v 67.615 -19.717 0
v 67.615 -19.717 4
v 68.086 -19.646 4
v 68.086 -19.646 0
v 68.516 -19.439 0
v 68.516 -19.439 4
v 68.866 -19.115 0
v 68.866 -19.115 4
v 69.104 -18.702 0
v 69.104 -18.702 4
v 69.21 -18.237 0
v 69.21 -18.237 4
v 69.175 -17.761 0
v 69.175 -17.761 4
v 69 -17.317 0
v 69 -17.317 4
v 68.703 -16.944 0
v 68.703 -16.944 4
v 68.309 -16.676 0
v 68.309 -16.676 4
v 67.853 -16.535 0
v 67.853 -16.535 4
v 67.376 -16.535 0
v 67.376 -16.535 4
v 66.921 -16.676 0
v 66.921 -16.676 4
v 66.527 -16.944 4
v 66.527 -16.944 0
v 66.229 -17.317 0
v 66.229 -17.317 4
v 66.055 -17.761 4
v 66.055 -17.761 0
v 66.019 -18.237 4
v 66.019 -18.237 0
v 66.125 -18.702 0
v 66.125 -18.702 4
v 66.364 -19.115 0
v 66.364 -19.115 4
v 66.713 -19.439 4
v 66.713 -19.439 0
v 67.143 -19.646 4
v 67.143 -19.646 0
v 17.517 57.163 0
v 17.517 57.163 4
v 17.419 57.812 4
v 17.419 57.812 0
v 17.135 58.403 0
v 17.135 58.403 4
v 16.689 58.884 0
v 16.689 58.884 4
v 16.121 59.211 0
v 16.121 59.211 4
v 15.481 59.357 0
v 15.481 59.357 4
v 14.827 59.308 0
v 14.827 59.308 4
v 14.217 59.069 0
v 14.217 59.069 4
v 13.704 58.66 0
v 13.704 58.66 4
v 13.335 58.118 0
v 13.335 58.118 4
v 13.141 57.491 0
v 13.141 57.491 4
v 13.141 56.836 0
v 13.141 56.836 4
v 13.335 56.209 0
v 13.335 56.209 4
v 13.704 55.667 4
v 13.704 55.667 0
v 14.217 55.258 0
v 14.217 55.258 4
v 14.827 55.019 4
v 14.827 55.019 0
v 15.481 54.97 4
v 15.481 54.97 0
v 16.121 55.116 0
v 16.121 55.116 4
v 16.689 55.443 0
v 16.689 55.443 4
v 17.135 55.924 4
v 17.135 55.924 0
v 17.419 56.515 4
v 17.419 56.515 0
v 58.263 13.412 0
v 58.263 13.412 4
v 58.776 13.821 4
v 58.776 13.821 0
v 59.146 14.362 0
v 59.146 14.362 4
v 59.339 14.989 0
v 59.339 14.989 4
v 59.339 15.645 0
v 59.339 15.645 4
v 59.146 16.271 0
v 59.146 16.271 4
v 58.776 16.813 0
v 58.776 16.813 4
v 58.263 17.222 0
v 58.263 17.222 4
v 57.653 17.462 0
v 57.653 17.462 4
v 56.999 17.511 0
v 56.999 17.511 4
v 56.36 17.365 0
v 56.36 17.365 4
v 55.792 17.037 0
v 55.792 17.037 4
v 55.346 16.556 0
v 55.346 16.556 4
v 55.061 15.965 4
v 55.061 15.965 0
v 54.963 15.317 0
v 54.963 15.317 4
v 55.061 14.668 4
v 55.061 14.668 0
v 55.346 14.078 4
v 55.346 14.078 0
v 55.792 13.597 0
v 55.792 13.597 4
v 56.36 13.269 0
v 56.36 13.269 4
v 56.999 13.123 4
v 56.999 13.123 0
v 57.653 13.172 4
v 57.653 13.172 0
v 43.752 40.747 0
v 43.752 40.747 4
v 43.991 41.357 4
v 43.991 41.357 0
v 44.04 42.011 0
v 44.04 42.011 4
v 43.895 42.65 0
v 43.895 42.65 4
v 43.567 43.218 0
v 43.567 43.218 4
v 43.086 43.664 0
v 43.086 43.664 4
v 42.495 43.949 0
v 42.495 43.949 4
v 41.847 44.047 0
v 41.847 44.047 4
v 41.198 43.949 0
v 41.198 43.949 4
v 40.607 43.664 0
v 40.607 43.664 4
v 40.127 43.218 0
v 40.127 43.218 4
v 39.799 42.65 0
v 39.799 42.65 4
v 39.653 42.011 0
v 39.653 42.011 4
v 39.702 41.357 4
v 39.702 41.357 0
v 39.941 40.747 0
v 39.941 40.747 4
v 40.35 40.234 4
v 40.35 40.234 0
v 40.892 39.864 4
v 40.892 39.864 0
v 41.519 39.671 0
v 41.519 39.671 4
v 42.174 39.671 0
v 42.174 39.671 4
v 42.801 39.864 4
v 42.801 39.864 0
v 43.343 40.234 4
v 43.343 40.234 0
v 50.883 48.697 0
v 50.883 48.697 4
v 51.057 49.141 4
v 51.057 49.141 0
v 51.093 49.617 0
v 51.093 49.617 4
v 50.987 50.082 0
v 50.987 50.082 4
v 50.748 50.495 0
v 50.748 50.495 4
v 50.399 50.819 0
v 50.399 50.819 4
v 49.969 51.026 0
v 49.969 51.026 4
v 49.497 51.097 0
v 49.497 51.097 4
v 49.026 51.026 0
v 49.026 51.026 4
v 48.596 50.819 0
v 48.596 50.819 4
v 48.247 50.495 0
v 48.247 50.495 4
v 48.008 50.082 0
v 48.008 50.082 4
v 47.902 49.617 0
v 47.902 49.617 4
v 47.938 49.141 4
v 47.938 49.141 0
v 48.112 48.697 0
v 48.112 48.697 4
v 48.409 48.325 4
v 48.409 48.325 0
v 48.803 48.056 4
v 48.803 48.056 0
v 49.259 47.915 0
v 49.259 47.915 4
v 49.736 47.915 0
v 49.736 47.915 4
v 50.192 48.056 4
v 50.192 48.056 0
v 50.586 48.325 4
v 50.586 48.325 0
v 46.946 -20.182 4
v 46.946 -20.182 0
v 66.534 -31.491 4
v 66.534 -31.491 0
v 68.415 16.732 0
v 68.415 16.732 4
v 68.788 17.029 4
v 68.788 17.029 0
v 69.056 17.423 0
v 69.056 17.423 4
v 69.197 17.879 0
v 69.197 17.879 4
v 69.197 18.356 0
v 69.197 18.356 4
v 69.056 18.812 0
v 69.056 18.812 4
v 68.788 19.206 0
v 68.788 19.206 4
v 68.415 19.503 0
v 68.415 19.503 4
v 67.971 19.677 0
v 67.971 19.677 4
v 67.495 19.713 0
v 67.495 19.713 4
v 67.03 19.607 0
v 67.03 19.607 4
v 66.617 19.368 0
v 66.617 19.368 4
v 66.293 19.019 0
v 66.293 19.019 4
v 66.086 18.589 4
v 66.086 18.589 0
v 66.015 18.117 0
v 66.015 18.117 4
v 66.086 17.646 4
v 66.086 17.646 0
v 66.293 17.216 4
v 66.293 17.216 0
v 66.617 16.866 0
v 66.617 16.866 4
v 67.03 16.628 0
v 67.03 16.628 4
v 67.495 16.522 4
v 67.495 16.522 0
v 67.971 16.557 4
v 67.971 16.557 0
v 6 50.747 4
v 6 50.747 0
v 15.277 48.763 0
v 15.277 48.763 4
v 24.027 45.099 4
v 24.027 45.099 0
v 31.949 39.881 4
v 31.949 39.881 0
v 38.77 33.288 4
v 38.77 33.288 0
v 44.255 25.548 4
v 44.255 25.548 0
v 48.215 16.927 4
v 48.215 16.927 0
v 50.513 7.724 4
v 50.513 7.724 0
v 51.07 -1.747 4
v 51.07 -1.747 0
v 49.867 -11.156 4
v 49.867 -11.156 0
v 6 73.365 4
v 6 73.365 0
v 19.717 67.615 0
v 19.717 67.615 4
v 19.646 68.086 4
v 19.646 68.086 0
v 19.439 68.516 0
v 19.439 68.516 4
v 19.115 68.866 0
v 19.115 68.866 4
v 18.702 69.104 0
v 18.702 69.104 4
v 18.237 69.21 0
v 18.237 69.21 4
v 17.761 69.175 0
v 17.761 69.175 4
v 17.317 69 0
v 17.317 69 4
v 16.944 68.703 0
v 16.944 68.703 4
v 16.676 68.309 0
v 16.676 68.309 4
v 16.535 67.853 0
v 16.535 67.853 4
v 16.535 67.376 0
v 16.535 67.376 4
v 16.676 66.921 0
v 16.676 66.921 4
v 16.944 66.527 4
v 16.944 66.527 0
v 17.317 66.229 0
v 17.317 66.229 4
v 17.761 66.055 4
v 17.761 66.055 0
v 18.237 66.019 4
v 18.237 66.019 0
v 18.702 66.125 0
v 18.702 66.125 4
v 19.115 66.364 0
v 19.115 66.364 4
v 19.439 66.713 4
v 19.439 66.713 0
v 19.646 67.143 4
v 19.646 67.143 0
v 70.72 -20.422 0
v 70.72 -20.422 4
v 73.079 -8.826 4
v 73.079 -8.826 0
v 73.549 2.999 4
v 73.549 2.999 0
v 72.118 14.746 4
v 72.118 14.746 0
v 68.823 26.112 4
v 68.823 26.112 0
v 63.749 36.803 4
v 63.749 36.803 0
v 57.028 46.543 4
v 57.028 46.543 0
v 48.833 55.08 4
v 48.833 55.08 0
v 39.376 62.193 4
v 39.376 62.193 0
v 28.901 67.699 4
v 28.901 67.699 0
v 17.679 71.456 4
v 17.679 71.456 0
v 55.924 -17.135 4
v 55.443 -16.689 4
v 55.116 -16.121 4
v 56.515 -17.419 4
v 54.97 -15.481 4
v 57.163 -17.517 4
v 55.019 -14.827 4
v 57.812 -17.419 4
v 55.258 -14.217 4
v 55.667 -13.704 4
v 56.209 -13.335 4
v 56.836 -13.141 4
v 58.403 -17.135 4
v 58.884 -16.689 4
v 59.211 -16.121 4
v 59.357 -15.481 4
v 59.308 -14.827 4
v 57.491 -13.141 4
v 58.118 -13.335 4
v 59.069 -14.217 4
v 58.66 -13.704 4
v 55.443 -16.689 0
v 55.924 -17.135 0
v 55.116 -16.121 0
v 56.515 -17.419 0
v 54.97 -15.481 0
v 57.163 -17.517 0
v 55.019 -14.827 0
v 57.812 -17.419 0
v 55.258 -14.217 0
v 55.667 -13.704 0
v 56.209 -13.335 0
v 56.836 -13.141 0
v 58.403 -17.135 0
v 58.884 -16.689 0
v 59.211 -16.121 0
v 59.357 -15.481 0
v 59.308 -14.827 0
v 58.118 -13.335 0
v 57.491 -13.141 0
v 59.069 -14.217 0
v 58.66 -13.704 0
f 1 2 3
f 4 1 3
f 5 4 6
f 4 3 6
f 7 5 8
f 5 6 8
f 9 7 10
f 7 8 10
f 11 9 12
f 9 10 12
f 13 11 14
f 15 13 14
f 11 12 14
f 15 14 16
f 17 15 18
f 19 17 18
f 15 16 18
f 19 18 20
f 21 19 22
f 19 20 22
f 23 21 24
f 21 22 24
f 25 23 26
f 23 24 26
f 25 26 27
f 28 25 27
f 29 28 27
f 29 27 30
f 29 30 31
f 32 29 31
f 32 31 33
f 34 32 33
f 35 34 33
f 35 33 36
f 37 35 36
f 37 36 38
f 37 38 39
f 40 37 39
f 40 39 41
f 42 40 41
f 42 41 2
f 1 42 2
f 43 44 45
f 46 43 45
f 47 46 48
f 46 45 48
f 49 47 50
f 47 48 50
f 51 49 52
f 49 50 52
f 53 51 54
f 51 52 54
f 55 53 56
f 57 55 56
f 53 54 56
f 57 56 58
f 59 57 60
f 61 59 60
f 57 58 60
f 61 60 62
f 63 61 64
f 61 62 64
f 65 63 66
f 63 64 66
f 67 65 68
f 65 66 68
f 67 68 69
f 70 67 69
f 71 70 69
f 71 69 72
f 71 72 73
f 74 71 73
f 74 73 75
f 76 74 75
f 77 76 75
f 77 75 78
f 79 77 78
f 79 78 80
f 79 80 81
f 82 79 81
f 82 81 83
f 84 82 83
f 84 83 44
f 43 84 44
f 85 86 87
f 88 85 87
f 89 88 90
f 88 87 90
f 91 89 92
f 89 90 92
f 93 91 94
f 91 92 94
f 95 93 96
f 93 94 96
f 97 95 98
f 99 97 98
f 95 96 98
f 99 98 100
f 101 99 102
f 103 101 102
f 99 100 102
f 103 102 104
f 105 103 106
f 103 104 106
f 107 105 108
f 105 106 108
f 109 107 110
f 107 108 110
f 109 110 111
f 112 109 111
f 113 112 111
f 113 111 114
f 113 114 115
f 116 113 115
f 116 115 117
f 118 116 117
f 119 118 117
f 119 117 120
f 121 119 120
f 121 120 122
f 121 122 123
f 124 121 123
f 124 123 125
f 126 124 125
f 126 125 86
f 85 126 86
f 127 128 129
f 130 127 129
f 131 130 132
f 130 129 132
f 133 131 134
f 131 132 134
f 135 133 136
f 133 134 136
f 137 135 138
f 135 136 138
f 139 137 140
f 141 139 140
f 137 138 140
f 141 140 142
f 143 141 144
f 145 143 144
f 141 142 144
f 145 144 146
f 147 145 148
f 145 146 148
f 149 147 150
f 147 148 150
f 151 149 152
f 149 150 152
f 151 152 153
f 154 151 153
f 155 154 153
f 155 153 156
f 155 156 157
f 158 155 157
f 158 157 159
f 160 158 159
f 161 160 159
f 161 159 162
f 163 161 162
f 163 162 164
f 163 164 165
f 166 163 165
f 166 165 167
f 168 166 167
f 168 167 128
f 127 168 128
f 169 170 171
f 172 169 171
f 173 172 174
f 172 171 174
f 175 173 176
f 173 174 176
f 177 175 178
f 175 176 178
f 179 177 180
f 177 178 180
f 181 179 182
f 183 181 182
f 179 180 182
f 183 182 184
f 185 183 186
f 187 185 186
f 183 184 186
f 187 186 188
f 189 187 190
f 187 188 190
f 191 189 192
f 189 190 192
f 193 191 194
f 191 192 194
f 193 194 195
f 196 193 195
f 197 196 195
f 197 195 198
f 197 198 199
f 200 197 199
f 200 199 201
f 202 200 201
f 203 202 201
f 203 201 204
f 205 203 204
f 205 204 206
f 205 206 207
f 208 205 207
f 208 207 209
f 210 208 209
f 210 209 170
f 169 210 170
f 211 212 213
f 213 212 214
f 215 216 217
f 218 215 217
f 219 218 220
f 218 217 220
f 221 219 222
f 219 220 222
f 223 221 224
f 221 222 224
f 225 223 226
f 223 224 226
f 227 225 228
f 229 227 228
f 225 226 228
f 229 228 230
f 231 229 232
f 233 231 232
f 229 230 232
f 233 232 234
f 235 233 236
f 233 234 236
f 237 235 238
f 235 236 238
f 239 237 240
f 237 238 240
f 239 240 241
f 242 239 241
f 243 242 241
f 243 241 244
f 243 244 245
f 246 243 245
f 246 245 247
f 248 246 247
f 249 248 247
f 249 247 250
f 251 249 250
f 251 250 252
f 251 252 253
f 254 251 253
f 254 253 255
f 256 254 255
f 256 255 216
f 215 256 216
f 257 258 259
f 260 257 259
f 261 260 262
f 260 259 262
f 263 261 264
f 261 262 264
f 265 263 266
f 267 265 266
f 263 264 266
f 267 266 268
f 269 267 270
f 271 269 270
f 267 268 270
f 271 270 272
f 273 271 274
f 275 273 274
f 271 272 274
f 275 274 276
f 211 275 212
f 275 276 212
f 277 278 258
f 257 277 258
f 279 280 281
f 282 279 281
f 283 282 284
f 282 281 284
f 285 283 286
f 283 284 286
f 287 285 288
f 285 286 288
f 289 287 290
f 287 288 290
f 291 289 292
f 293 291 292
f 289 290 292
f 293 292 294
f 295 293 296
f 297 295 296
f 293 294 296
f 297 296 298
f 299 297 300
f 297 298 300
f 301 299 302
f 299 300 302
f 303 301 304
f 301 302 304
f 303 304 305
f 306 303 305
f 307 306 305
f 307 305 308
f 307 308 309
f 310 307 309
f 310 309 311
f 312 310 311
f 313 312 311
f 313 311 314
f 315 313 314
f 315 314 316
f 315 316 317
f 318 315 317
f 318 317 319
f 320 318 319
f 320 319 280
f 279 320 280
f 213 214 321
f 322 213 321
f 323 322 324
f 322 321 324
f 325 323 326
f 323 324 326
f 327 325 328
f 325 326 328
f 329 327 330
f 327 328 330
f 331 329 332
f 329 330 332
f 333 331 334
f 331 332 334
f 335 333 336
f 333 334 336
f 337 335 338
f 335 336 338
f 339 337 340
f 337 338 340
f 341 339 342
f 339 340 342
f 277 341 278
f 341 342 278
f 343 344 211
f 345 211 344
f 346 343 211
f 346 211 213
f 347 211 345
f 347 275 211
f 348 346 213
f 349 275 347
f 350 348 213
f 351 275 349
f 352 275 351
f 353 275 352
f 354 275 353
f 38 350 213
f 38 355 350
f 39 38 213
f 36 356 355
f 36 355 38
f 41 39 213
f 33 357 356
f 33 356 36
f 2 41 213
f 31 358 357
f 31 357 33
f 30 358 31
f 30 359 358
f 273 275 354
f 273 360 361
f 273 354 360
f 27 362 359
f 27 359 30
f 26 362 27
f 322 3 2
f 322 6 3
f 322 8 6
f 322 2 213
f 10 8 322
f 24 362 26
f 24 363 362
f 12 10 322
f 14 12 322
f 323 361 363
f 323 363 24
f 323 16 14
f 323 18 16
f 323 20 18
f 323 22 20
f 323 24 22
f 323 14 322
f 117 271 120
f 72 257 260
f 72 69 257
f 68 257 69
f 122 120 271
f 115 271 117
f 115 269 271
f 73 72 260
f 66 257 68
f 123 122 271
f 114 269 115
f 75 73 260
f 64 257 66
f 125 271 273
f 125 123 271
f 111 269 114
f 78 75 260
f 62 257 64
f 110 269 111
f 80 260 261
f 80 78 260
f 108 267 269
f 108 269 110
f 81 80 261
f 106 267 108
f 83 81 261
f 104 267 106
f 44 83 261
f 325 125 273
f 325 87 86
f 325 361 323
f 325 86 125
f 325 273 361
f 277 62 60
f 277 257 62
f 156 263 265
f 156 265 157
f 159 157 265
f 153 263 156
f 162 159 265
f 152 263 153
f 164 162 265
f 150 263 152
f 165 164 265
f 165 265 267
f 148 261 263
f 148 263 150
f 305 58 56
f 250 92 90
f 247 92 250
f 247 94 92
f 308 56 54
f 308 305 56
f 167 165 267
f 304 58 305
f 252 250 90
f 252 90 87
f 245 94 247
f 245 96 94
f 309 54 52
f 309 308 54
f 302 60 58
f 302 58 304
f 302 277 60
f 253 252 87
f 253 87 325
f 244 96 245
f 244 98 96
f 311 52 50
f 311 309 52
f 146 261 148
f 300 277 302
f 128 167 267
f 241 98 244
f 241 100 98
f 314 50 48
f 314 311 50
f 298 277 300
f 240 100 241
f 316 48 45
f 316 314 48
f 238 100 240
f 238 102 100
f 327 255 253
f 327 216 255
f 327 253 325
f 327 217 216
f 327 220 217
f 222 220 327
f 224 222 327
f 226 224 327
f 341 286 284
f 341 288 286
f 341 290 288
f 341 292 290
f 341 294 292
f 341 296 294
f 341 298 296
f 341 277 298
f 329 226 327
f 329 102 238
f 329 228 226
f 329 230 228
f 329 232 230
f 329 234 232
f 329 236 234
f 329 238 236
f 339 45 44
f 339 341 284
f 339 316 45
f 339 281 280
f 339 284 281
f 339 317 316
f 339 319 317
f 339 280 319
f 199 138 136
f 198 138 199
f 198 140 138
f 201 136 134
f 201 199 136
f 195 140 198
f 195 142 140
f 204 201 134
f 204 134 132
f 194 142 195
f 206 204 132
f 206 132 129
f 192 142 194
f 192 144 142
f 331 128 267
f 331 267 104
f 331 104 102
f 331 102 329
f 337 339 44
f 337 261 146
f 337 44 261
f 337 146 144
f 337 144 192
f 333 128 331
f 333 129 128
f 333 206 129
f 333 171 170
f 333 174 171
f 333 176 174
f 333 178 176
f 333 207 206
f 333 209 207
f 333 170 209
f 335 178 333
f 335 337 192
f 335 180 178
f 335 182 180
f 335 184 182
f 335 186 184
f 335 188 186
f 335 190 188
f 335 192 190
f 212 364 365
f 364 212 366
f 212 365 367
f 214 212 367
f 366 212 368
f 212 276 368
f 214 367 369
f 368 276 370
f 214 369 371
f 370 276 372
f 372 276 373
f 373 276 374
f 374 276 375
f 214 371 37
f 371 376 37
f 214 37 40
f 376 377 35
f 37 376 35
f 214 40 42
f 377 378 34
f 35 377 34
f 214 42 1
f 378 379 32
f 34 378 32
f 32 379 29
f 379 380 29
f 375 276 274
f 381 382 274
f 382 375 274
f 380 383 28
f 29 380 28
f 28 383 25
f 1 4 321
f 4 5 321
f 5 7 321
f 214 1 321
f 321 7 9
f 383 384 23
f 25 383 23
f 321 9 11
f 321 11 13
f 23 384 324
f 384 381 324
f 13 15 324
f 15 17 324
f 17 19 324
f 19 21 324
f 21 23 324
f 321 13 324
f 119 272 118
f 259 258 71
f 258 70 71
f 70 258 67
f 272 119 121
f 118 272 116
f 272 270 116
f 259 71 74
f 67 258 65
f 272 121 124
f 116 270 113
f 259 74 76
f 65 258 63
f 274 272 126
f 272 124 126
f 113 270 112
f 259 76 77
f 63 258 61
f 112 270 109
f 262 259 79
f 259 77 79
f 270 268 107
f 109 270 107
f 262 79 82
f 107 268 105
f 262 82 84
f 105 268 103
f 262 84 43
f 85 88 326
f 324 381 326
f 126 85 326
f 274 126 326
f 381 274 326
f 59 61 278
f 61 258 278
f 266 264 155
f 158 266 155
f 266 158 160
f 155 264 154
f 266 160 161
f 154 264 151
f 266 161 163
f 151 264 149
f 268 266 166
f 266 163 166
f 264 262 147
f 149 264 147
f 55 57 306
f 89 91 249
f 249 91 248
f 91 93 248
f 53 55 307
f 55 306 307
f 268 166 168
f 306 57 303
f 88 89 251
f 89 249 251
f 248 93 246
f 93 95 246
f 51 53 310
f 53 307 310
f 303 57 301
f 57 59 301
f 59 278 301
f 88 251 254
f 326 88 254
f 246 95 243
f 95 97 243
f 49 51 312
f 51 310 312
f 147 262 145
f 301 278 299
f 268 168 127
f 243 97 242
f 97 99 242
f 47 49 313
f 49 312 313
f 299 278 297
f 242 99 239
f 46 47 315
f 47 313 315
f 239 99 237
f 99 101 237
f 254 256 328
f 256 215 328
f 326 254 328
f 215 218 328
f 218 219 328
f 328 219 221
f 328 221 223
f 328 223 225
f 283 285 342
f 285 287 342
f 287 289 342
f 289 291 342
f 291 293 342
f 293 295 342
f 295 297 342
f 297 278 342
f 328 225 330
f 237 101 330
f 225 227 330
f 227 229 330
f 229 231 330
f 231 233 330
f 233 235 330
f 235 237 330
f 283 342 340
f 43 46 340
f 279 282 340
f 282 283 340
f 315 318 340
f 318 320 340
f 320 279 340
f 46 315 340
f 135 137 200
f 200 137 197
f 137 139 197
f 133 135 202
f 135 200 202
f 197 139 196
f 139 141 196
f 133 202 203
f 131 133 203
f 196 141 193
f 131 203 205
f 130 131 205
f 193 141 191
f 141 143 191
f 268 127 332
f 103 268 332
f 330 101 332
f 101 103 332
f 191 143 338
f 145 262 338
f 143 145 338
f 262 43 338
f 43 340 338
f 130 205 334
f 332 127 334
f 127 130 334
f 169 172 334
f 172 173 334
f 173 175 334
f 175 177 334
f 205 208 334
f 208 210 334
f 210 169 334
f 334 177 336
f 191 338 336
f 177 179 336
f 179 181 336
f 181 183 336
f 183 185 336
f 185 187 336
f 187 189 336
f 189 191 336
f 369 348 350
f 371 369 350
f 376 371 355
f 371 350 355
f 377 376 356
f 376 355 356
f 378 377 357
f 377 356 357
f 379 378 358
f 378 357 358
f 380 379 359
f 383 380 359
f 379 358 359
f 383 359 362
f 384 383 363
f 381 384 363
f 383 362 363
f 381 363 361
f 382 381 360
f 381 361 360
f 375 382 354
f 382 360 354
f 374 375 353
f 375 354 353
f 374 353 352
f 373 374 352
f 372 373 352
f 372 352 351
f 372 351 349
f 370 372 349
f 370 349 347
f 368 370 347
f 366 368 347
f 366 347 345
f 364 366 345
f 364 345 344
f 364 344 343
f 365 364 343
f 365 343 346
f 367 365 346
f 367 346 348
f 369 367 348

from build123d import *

# Parameters (mm, degrees)
BOSS_EXTRU_1_DEPTH = 4
SKETCH2_R          = 1.6
SKETCH2_R_2        = 2.2
CUT_EXTRUDE1_DEPTH = 105.004154725
CIRPATTERN1_COUNT  = 12


with BuildPart() as part:
    # Esquisse1 → Boss.-Extru.1 (new body)
    with BuildSketch(Plane.XY):
        with BuildLine():
            Line((6, 73.365060485), (6, 50.746526975))
            ThreePointArc((6, 50.746526975), (44.255153019, 25.547826351), (46.94579921, -20.181722835))
            Line((46.94579921, -20.181722835), (66.533866524, -31.490898771))
            ThreePointArc((66.533866524, -31.490898771), (63.749380359, 36.802834183), (6, 73.365060485))
        make_face()
    extrude(amount=BOSS_EXTRU_1_DEPTH)

    # Sketch2 → Cut-Extrude1 (cut, through all)
    with BuildSketch(Plane.XY.offset(4)):
        with Locations((18.117333157, 67.61480784)):
            Circle(SKETCH2_R)
        with Locations((15.316911089, 57.1634904)):
            Circle(SKETCH2_R_2)
    cut_extrude1 = extrude(amount=-CUT_EXTRUDE1_DEPTH, mode=Mode.SUBTRACT)

    # CirPattern1: Cut-Extrude1 ×12 about axis
    cirpattern1_axis = Axis((0, 0, -0.2), (0, 0, 1))
    for i in range(1, CIRPATTERN1_COUNT):
        add(cut_extrude1.rotate(cirpattern1_axis, i * 360 / CIRPATTERN1_COUNT), mode=Mode.SUBTRACT)


solid = part.part
